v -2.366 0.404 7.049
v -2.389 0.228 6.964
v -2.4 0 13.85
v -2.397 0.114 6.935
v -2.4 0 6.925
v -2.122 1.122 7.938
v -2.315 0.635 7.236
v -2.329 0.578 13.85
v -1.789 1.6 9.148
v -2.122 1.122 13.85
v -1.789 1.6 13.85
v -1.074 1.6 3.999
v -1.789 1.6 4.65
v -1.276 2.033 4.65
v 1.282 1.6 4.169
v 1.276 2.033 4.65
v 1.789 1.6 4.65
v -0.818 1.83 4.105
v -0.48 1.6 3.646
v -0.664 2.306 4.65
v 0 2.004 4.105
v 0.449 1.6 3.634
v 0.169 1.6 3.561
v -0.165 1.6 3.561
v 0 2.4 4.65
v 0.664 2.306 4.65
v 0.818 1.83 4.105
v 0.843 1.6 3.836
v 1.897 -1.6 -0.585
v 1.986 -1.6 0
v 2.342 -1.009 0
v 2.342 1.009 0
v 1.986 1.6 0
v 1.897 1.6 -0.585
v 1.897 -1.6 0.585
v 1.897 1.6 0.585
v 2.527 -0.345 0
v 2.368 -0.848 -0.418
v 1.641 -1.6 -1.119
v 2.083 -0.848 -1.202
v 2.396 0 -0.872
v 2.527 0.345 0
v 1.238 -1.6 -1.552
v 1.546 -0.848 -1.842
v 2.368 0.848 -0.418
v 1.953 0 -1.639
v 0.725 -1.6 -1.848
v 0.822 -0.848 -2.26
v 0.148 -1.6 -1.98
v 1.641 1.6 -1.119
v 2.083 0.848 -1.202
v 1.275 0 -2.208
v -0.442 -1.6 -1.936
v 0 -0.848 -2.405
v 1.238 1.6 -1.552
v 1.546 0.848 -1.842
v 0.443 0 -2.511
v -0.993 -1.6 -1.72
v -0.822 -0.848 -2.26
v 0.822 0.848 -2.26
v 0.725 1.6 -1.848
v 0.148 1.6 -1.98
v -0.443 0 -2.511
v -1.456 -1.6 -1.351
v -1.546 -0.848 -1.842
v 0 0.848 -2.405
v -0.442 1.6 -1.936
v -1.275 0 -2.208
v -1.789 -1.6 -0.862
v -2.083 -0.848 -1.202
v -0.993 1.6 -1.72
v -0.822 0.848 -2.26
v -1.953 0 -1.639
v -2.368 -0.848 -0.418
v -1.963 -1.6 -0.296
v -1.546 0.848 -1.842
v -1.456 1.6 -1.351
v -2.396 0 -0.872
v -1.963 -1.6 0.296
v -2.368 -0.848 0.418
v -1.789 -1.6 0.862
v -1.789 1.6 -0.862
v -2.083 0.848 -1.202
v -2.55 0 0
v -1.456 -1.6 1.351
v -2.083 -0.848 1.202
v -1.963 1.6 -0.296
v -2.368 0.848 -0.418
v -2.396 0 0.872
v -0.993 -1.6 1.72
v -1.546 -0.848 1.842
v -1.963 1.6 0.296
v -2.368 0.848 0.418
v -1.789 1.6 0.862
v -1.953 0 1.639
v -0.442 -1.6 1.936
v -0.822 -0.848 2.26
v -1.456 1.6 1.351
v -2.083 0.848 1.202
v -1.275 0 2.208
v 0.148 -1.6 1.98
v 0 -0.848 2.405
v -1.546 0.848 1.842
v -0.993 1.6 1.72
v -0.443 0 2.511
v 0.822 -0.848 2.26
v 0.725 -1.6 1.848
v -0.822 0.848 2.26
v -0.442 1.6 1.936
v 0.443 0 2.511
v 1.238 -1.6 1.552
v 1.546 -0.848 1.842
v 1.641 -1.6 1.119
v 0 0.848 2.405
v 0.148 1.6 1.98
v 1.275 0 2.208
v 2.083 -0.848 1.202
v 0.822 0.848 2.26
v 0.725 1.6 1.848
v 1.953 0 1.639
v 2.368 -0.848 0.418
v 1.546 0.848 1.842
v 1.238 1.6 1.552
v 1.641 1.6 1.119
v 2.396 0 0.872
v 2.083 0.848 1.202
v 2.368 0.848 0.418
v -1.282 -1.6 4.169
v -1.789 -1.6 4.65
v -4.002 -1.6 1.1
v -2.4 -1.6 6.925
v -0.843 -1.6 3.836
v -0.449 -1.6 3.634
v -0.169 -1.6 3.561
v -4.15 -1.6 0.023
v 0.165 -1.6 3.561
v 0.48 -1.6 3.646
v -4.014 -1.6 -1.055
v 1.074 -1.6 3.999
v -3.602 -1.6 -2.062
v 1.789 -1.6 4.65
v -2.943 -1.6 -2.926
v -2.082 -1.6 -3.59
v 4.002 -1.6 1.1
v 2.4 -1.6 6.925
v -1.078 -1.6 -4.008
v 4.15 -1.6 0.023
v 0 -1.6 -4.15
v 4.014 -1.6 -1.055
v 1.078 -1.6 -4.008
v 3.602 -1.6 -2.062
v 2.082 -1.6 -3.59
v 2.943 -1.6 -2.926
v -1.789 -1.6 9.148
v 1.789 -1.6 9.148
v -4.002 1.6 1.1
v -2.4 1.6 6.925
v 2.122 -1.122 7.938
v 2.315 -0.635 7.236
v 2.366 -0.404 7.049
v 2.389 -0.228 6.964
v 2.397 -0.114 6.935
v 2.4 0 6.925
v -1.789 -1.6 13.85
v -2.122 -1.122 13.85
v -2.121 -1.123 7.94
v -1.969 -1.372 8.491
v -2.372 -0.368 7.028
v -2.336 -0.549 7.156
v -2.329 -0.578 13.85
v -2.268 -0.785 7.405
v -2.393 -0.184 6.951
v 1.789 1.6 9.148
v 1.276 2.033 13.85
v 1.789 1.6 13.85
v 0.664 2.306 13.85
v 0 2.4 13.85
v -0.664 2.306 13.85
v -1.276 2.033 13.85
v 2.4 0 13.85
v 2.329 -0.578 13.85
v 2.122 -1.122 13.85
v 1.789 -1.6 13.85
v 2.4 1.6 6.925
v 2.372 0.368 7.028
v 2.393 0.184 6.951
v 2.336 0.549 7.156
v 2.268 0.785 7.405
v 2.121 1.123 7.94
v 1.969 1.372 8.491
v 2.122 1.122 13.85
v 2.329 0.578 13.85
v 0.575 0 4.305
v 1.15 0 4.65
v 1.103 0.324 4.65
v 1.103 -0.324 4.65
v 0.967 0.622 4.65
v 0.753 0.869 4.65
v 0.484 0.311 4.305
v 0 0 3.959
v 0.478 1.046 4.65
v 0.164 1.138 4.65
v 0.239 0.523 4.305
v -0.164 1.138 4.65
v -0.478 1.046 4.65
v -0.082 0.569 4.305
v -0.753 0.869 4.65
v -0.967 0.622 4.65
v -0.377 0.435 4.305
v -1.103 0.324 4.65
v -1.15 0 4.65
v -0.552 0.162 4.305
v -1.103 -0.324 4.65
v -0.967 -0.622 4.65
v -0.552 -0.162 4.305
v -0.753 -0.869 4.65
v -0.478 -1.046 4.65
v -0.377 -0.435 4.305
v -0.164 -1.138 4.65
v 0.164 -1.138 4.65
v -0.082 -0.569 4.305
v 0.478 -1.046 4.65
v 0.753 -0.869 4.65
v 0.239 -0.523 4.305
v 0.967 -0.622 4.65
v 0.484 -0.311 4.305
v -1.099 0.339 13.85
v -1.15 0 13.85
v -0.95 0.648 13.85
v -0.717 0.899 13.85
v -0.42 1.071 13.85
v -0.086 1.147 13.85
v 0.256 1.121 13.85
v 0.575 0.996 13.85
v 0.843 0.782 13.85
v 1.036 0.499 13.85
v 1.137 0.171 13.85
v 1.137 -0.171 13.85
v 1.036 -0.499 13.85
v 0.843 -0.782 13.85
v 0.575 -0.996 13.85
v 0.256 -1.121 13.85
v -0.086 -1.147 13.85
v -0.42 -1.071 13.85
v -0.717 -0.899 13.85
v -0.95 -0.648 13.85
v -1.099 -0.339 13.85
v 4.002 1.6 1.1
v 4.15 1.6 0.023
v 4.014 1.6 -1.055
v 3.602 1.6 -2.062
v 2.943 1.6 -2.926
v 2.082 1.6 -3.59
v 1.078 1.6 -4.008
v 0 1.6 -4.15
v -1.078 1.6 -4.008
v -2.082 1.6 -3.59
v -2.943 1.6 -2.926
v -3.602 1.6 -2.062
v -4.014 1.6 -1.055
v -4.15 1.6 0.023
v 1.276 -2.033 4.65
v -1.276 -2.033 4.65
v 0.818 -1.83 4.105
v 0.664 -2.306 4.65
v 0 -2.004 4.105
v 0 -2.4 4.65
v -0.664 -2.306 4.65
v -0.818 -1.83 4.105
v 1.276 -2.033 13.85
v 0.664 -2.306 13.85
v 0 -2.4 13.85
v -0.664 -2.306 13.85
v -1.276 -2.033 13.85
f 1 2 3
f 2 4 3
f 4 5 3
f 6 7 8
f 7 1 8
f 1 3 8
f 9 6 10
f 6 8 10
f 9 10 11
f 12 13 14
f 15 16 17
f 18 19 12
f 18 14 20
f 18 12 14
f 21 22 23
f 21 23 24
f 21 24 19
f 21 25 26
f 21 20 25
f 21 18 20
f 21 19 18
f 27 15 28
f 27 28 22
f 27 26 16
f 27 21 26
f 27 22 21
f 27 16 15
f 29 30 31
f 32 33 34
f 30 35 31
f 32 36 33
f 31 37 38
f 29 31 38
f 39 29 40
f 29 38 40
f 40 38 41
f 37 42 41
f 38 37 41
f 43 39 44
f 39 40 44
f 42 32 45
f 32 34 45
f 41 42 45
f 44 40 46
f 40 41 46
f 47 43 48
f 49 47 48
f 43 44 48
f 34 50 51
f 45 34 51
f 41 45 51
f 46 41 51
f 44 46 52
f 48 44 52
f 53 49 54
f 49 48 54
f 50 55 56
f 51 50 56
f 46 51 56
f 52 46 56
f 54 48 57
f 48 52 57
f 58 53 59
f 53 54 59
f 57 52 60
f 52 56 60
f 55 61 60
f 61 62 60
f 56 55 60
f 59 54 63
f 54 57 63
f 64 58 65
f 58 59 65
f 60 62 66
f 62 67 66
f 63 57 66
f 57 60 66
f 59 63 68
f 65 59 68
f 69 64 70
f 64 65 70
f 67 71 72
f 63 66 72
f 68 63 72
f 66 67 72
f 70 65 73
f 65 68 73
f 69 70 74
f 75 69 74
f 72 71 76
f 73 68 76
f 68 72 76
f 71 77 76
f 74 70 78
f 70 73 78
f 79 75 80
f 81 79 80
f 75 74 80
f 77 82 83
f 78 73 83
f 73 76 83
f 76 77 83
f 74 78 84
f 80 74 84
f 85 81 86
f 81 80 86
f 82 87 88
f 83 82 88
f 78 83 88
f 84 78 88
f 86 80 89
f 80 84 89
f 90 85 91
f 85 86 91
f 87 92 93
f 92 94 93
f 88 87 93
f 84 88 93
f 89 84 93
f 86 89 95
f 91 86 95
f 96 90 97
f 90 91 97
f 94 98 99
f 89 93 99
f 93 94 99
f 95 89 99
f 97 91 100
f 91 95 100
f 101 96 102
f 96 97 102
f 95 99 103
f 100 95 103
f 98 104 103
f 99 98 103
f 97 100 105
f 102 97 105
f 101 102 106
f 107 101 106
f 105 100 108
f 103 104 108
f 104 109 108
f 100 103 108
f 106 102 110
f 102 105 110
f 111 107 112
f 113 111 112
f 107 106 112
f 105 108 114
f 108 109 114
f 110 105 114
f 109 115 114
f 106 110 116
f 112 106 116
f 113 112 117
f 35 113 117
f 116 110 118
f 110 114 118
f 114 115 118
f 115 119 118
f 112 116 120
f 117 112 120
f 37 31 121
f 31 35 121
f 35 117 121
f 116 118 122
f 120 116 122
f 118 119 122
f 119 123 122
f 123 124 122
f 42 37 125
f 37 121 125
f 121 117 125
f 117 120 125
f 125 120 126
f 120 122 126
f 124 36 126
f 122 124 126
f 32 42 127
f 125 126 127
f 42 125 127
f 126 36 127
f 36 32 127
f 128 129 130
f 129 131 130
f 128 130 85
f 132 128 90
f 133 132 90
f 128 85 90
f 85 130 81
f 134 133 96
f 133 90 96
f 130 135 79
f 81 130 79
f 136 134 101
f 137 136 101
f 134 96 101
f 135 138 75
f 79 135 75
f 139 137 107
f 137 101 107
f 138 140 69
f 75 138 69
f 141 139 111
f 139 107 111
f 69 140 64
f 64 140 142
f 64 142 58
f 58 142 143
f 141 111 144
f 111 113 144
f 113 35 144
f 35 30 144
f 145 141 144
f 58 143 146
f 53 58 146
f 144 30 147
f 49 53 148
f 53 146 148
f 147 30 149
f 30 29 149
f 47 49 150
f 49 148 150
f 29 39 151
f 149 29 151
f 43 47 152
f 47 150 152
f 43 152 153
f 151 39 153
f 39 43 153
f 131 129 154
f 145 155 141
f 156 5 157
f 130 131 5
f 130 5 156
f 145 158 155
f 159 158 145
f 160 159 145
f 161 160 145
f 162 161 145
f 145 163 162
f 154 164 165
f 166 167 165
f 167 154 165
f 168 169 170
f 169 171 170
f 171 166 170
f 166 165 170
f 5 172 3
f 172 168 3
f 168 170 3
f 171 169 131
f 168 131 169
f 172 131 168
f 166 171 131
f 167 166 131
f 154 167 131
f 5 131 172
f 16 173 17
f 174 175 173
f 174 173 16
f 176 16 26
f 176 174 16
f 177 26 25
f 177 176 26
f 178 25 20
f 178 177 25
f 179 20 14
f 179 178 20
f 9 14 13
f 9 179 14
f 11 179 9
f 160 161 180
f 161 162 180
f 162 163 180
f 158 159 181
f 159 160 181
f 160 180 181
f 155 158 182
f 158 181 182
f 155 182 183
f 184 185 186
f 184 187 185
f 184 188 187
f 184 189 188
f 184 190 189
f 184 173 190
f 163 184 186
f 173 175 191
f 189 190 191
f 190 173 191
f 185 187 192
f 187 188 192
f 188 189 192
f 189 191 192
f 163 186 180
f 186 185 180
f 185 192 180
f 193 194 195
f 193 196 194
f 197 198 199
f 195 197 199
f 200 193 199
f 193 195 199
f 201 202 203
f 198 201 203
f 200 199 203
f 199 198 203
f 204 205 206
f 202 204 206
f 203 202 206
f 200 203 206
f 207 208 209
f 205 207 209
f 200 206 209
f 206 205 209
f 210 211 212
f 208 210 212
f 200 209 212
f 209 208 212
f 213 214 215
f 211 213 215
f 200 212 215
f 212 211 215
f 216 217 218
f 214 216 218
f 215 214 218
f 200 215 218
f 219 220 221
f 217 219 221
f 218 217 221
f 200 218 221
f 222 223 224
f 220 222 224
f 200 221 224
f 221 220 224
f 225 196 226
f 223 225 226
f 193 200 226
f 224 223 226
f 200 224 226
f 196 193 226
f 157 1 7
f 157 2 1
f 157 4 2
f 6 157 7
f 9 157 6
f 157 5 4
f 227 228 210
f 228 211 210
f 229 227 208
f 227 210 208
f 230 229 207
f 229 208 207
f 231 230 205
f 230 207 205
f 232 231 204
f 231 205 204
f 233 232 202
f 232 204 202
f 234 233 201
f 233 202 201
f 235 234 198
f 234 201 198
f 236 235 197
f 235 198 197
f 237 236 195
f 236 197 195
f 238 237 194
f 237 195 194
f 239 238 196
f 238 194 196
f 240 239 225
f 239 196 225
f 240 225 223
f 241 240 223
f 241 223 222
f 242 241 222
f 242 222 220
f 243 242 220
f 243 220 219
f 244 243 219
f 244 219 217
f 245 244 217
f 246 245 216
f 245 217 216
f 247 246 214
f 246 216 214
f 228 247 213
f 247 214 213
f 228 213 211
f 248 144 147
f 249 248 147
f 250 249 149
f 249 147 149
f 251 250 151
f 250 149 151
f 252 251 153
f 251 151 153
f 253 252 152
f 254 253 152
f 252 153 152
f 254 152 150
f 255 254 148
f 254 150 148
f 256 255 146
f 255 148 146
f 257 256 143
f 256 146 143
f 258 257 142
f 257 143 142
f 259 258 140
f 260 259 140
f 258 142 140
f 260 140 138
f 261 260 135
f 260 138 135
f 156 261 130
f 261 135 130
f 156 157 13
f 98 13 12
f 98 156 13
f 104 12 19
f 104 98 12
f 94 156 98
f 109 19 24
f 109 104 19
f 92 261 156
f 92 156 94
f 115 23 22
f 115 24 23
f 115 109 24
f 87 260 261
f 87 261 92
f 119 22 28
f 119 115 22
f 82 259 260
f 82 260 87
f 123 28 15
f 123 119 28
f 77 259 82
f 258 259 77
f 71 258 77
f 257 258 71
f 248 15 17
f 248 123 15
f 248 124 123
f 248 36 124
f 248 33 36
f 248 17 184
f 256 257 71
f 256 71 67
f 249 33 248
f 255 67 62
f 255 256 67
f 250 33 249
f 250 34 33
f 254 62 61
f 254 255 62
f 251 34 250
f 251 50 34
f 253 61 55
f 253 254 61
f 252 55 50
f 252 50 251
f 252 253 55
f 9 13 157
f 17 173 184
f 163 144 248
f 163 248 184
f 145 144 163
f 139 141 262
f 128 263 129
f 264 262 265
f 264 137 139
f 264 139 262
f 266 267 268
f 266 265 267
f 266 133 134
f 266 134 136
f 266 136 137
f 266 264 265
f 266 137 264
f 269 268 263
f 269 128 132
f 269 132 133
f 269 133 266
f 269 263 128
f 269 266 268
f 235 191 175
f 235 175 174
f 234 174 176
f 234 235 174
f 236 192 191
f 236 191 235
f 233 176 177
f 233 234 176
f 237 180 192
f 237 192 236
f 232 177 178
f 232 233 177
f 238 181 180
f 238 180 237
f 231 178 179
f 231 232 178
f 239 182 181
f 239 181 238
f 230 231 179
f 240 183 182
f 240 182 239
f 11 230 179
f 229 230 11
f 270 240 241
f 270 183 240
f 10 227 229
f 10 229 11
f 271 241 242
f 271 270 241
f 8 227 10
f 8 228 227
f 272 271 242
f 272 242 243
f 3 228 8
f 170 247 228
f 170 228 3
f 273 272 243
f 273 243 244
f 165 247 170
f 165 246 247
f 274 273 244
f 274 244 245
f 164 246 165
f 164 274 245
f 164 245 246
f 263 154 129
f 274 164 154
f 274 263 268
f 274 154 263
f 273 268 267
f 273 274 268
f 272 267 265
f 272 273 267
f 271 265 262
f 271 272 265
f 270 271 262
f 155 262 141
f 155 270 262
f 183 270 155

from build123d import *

# Parameters (mm, degrees)
BOSS_EXTRUDE1_START                = -3.2
BOSS_EXTRUDE1_DEPTH                = 3.2
SKETCH3_R                          = 2.4
BOSS_EXTRUDE2_DEPTH                = 9.2
SKETCH4_R                          = 2.4
BOSS_EXTRUDE3_DEPTH                = 1.2
BOSS_EXTRUDE3_TAPER                = 36
CUT_EXTRUDE1_DEPTH                 = 6.925
BOSS_EXTRUDE4_DEPTH                = 3.2
TAP_DRILL_FOR_M2_2_HELICOIL1_D     = 2.3
TAP_DRILL_FOR_M2_2_HELICOIL1_DEPTH = 9.2
TAP_DRILL_FOR_M2_2_HELICOIL1_TIP   = 0.690989712


with BuildPart() as part:
    # Sketch1 → Revolve1 (revolve)
    with BuildSketch(Plane.XY):
        with BuildLine():
            Line((1.985572965, 1.6), (4.15, 1.6))
            Line((4.15, 1.6), (4.15, -1.6))
            Line((4.15, -1.6), (1.985572965, -1.6))
            ThreePointArc((1.985572965, -1.6), (2.55, 0), (1.985572965, 1.6))
        make_face()
    revolve(axis=Axis((0, 0, 0), (0, 1, 0)))

    # Sketch2 → Boss-Extrude1 (add)
    with BuildSketch(Plane(origin=(0, 1.6, 0), x_dir=(1, 0, 0), z_dir=(0, 1, 0)).offset(BOSS_EXTRUDE1_START)):
        with BuildLine():
            Line((-2.4, -6.925), (-4.001507312, -1.100199632))
            ThreePointArc((-4.001507312, -1.100199632), (0, -4.15), (4.001507312, -1.100199632))
            Line((4.001507312, -1.100199632), (2.4, -6.925))
            Line((2.4, -6.925), (2.4, -13.85))
            Line((2.4, -13.85), (-2.4, -13.85))
            Line((-2.4, -13.85), (-2.4, -6.925))
        make_face()
    extrude(amount=BOSS_EXTRUDE1_DEPTH)

    # Sketch3 → Boss-Extrude2 (add)
    with BuildSketch(Plane.XY.offset(13.85)):
        Circle(SKETCH3_R)
    extrude(amount=-BOSS_EXTRUDE2_DEPTH)

    # Sketch4 → Boss-Extrude3 (add)
    with BuildSketch(Plane(origin=(0, 0, 4.65), x_dir=(-1, 0, 0), z_dir=(0, 0, -1))):
        Circle(SKETCH4_R)
    extrude(amount=BOSS_EXTRUDE3_DEPTH, taper=BOSS_EXTRUDE3_TAPER)

    # Sketch5 → Cut-Extrude1 (cut)
    with BuildSketch(Plane.XY.offset(13.85)):
        with BuildLine():
            Line((2.4, 1.6), (1.788854382, 1.6))
            ThreePointArc((1.788854382, 1.6), (2.242013662, 0.856373015), (2.4, 0))
            Line((2.4, 0), (2.4, 1.6))
        make_face()
        with BuildLine():
            Line((2.4, -1.6), (2.4, 0))
            ThreePointArc((2.4, 0), (2.242013662, -0.856373015), (1.788854382, -1.6))
            Line((1.788854382, -1.6), (2.4, -1.6))
        make_face()
        with BuildLine():
            Line((-2.4, 1.6), (-2.4, 0))
            ThreePointArc((-2.4, 0), (-2.242013662, 0.856373015), (-1.788854382, 1.6))
            Line((-1.788854382, 1.6), (-2.4, 1.6))
        make_face()
        with BuildLine():
            Line((-2.4, 0), (-2.4, -1.6))
            Line((-2.4, -1.6), (-1.788854382, -1.6))
            ThreePointArc((-1.788854382, -1.6), (-2.242013662, -0.856373015), (-2.4, 0))
        make_face()
    extrude(amount=-CUT_EXTRUDE1_DEPTH, mode=Mode.SUBTRACT)

    # Sketch6 → Boss-Extrude4 (add)
    with BuildSketch(Plane(origin=(0, 1.6, 0), x_dir=(1, 0, 0), z_dir=(0, 1, 0))):
        Polygon((-2.4, -6.925), (-1, -12.016903392), (1, -12.016903392), (2.4, -6.925), align=None)
    extrude(amount=-BOSS_EXTRUDE4_DEPTH)

    # Tap Drill for M2.2 Helicoil1
    with Locations(Plane.XY.offset(13.85)):
        with Locations((0, 0)):
            Hole(TAP_DRILL_FOR_M2_2_HELICOIL1_D / 2, depth=TAP_DRILL_FOR_M2_2_HELICOIL1_DEPTH)
            with Locations((0, 0, -(TAP_DRILL_FOR_M2_2_HELICOIL1_DEPTH + TAP_DRILL_FOR_M2_2_HELICOIL1_TIP / 2))):  # 118° drill point
                Cone(0, TAP_DRILL_FOR_M2_2_HELICOIL1_D / 2, TAP_DRILL_FOR_M2_2_HELICOIL1_TIP, mode=Mode.SUBTRACT)


solid = part.part
